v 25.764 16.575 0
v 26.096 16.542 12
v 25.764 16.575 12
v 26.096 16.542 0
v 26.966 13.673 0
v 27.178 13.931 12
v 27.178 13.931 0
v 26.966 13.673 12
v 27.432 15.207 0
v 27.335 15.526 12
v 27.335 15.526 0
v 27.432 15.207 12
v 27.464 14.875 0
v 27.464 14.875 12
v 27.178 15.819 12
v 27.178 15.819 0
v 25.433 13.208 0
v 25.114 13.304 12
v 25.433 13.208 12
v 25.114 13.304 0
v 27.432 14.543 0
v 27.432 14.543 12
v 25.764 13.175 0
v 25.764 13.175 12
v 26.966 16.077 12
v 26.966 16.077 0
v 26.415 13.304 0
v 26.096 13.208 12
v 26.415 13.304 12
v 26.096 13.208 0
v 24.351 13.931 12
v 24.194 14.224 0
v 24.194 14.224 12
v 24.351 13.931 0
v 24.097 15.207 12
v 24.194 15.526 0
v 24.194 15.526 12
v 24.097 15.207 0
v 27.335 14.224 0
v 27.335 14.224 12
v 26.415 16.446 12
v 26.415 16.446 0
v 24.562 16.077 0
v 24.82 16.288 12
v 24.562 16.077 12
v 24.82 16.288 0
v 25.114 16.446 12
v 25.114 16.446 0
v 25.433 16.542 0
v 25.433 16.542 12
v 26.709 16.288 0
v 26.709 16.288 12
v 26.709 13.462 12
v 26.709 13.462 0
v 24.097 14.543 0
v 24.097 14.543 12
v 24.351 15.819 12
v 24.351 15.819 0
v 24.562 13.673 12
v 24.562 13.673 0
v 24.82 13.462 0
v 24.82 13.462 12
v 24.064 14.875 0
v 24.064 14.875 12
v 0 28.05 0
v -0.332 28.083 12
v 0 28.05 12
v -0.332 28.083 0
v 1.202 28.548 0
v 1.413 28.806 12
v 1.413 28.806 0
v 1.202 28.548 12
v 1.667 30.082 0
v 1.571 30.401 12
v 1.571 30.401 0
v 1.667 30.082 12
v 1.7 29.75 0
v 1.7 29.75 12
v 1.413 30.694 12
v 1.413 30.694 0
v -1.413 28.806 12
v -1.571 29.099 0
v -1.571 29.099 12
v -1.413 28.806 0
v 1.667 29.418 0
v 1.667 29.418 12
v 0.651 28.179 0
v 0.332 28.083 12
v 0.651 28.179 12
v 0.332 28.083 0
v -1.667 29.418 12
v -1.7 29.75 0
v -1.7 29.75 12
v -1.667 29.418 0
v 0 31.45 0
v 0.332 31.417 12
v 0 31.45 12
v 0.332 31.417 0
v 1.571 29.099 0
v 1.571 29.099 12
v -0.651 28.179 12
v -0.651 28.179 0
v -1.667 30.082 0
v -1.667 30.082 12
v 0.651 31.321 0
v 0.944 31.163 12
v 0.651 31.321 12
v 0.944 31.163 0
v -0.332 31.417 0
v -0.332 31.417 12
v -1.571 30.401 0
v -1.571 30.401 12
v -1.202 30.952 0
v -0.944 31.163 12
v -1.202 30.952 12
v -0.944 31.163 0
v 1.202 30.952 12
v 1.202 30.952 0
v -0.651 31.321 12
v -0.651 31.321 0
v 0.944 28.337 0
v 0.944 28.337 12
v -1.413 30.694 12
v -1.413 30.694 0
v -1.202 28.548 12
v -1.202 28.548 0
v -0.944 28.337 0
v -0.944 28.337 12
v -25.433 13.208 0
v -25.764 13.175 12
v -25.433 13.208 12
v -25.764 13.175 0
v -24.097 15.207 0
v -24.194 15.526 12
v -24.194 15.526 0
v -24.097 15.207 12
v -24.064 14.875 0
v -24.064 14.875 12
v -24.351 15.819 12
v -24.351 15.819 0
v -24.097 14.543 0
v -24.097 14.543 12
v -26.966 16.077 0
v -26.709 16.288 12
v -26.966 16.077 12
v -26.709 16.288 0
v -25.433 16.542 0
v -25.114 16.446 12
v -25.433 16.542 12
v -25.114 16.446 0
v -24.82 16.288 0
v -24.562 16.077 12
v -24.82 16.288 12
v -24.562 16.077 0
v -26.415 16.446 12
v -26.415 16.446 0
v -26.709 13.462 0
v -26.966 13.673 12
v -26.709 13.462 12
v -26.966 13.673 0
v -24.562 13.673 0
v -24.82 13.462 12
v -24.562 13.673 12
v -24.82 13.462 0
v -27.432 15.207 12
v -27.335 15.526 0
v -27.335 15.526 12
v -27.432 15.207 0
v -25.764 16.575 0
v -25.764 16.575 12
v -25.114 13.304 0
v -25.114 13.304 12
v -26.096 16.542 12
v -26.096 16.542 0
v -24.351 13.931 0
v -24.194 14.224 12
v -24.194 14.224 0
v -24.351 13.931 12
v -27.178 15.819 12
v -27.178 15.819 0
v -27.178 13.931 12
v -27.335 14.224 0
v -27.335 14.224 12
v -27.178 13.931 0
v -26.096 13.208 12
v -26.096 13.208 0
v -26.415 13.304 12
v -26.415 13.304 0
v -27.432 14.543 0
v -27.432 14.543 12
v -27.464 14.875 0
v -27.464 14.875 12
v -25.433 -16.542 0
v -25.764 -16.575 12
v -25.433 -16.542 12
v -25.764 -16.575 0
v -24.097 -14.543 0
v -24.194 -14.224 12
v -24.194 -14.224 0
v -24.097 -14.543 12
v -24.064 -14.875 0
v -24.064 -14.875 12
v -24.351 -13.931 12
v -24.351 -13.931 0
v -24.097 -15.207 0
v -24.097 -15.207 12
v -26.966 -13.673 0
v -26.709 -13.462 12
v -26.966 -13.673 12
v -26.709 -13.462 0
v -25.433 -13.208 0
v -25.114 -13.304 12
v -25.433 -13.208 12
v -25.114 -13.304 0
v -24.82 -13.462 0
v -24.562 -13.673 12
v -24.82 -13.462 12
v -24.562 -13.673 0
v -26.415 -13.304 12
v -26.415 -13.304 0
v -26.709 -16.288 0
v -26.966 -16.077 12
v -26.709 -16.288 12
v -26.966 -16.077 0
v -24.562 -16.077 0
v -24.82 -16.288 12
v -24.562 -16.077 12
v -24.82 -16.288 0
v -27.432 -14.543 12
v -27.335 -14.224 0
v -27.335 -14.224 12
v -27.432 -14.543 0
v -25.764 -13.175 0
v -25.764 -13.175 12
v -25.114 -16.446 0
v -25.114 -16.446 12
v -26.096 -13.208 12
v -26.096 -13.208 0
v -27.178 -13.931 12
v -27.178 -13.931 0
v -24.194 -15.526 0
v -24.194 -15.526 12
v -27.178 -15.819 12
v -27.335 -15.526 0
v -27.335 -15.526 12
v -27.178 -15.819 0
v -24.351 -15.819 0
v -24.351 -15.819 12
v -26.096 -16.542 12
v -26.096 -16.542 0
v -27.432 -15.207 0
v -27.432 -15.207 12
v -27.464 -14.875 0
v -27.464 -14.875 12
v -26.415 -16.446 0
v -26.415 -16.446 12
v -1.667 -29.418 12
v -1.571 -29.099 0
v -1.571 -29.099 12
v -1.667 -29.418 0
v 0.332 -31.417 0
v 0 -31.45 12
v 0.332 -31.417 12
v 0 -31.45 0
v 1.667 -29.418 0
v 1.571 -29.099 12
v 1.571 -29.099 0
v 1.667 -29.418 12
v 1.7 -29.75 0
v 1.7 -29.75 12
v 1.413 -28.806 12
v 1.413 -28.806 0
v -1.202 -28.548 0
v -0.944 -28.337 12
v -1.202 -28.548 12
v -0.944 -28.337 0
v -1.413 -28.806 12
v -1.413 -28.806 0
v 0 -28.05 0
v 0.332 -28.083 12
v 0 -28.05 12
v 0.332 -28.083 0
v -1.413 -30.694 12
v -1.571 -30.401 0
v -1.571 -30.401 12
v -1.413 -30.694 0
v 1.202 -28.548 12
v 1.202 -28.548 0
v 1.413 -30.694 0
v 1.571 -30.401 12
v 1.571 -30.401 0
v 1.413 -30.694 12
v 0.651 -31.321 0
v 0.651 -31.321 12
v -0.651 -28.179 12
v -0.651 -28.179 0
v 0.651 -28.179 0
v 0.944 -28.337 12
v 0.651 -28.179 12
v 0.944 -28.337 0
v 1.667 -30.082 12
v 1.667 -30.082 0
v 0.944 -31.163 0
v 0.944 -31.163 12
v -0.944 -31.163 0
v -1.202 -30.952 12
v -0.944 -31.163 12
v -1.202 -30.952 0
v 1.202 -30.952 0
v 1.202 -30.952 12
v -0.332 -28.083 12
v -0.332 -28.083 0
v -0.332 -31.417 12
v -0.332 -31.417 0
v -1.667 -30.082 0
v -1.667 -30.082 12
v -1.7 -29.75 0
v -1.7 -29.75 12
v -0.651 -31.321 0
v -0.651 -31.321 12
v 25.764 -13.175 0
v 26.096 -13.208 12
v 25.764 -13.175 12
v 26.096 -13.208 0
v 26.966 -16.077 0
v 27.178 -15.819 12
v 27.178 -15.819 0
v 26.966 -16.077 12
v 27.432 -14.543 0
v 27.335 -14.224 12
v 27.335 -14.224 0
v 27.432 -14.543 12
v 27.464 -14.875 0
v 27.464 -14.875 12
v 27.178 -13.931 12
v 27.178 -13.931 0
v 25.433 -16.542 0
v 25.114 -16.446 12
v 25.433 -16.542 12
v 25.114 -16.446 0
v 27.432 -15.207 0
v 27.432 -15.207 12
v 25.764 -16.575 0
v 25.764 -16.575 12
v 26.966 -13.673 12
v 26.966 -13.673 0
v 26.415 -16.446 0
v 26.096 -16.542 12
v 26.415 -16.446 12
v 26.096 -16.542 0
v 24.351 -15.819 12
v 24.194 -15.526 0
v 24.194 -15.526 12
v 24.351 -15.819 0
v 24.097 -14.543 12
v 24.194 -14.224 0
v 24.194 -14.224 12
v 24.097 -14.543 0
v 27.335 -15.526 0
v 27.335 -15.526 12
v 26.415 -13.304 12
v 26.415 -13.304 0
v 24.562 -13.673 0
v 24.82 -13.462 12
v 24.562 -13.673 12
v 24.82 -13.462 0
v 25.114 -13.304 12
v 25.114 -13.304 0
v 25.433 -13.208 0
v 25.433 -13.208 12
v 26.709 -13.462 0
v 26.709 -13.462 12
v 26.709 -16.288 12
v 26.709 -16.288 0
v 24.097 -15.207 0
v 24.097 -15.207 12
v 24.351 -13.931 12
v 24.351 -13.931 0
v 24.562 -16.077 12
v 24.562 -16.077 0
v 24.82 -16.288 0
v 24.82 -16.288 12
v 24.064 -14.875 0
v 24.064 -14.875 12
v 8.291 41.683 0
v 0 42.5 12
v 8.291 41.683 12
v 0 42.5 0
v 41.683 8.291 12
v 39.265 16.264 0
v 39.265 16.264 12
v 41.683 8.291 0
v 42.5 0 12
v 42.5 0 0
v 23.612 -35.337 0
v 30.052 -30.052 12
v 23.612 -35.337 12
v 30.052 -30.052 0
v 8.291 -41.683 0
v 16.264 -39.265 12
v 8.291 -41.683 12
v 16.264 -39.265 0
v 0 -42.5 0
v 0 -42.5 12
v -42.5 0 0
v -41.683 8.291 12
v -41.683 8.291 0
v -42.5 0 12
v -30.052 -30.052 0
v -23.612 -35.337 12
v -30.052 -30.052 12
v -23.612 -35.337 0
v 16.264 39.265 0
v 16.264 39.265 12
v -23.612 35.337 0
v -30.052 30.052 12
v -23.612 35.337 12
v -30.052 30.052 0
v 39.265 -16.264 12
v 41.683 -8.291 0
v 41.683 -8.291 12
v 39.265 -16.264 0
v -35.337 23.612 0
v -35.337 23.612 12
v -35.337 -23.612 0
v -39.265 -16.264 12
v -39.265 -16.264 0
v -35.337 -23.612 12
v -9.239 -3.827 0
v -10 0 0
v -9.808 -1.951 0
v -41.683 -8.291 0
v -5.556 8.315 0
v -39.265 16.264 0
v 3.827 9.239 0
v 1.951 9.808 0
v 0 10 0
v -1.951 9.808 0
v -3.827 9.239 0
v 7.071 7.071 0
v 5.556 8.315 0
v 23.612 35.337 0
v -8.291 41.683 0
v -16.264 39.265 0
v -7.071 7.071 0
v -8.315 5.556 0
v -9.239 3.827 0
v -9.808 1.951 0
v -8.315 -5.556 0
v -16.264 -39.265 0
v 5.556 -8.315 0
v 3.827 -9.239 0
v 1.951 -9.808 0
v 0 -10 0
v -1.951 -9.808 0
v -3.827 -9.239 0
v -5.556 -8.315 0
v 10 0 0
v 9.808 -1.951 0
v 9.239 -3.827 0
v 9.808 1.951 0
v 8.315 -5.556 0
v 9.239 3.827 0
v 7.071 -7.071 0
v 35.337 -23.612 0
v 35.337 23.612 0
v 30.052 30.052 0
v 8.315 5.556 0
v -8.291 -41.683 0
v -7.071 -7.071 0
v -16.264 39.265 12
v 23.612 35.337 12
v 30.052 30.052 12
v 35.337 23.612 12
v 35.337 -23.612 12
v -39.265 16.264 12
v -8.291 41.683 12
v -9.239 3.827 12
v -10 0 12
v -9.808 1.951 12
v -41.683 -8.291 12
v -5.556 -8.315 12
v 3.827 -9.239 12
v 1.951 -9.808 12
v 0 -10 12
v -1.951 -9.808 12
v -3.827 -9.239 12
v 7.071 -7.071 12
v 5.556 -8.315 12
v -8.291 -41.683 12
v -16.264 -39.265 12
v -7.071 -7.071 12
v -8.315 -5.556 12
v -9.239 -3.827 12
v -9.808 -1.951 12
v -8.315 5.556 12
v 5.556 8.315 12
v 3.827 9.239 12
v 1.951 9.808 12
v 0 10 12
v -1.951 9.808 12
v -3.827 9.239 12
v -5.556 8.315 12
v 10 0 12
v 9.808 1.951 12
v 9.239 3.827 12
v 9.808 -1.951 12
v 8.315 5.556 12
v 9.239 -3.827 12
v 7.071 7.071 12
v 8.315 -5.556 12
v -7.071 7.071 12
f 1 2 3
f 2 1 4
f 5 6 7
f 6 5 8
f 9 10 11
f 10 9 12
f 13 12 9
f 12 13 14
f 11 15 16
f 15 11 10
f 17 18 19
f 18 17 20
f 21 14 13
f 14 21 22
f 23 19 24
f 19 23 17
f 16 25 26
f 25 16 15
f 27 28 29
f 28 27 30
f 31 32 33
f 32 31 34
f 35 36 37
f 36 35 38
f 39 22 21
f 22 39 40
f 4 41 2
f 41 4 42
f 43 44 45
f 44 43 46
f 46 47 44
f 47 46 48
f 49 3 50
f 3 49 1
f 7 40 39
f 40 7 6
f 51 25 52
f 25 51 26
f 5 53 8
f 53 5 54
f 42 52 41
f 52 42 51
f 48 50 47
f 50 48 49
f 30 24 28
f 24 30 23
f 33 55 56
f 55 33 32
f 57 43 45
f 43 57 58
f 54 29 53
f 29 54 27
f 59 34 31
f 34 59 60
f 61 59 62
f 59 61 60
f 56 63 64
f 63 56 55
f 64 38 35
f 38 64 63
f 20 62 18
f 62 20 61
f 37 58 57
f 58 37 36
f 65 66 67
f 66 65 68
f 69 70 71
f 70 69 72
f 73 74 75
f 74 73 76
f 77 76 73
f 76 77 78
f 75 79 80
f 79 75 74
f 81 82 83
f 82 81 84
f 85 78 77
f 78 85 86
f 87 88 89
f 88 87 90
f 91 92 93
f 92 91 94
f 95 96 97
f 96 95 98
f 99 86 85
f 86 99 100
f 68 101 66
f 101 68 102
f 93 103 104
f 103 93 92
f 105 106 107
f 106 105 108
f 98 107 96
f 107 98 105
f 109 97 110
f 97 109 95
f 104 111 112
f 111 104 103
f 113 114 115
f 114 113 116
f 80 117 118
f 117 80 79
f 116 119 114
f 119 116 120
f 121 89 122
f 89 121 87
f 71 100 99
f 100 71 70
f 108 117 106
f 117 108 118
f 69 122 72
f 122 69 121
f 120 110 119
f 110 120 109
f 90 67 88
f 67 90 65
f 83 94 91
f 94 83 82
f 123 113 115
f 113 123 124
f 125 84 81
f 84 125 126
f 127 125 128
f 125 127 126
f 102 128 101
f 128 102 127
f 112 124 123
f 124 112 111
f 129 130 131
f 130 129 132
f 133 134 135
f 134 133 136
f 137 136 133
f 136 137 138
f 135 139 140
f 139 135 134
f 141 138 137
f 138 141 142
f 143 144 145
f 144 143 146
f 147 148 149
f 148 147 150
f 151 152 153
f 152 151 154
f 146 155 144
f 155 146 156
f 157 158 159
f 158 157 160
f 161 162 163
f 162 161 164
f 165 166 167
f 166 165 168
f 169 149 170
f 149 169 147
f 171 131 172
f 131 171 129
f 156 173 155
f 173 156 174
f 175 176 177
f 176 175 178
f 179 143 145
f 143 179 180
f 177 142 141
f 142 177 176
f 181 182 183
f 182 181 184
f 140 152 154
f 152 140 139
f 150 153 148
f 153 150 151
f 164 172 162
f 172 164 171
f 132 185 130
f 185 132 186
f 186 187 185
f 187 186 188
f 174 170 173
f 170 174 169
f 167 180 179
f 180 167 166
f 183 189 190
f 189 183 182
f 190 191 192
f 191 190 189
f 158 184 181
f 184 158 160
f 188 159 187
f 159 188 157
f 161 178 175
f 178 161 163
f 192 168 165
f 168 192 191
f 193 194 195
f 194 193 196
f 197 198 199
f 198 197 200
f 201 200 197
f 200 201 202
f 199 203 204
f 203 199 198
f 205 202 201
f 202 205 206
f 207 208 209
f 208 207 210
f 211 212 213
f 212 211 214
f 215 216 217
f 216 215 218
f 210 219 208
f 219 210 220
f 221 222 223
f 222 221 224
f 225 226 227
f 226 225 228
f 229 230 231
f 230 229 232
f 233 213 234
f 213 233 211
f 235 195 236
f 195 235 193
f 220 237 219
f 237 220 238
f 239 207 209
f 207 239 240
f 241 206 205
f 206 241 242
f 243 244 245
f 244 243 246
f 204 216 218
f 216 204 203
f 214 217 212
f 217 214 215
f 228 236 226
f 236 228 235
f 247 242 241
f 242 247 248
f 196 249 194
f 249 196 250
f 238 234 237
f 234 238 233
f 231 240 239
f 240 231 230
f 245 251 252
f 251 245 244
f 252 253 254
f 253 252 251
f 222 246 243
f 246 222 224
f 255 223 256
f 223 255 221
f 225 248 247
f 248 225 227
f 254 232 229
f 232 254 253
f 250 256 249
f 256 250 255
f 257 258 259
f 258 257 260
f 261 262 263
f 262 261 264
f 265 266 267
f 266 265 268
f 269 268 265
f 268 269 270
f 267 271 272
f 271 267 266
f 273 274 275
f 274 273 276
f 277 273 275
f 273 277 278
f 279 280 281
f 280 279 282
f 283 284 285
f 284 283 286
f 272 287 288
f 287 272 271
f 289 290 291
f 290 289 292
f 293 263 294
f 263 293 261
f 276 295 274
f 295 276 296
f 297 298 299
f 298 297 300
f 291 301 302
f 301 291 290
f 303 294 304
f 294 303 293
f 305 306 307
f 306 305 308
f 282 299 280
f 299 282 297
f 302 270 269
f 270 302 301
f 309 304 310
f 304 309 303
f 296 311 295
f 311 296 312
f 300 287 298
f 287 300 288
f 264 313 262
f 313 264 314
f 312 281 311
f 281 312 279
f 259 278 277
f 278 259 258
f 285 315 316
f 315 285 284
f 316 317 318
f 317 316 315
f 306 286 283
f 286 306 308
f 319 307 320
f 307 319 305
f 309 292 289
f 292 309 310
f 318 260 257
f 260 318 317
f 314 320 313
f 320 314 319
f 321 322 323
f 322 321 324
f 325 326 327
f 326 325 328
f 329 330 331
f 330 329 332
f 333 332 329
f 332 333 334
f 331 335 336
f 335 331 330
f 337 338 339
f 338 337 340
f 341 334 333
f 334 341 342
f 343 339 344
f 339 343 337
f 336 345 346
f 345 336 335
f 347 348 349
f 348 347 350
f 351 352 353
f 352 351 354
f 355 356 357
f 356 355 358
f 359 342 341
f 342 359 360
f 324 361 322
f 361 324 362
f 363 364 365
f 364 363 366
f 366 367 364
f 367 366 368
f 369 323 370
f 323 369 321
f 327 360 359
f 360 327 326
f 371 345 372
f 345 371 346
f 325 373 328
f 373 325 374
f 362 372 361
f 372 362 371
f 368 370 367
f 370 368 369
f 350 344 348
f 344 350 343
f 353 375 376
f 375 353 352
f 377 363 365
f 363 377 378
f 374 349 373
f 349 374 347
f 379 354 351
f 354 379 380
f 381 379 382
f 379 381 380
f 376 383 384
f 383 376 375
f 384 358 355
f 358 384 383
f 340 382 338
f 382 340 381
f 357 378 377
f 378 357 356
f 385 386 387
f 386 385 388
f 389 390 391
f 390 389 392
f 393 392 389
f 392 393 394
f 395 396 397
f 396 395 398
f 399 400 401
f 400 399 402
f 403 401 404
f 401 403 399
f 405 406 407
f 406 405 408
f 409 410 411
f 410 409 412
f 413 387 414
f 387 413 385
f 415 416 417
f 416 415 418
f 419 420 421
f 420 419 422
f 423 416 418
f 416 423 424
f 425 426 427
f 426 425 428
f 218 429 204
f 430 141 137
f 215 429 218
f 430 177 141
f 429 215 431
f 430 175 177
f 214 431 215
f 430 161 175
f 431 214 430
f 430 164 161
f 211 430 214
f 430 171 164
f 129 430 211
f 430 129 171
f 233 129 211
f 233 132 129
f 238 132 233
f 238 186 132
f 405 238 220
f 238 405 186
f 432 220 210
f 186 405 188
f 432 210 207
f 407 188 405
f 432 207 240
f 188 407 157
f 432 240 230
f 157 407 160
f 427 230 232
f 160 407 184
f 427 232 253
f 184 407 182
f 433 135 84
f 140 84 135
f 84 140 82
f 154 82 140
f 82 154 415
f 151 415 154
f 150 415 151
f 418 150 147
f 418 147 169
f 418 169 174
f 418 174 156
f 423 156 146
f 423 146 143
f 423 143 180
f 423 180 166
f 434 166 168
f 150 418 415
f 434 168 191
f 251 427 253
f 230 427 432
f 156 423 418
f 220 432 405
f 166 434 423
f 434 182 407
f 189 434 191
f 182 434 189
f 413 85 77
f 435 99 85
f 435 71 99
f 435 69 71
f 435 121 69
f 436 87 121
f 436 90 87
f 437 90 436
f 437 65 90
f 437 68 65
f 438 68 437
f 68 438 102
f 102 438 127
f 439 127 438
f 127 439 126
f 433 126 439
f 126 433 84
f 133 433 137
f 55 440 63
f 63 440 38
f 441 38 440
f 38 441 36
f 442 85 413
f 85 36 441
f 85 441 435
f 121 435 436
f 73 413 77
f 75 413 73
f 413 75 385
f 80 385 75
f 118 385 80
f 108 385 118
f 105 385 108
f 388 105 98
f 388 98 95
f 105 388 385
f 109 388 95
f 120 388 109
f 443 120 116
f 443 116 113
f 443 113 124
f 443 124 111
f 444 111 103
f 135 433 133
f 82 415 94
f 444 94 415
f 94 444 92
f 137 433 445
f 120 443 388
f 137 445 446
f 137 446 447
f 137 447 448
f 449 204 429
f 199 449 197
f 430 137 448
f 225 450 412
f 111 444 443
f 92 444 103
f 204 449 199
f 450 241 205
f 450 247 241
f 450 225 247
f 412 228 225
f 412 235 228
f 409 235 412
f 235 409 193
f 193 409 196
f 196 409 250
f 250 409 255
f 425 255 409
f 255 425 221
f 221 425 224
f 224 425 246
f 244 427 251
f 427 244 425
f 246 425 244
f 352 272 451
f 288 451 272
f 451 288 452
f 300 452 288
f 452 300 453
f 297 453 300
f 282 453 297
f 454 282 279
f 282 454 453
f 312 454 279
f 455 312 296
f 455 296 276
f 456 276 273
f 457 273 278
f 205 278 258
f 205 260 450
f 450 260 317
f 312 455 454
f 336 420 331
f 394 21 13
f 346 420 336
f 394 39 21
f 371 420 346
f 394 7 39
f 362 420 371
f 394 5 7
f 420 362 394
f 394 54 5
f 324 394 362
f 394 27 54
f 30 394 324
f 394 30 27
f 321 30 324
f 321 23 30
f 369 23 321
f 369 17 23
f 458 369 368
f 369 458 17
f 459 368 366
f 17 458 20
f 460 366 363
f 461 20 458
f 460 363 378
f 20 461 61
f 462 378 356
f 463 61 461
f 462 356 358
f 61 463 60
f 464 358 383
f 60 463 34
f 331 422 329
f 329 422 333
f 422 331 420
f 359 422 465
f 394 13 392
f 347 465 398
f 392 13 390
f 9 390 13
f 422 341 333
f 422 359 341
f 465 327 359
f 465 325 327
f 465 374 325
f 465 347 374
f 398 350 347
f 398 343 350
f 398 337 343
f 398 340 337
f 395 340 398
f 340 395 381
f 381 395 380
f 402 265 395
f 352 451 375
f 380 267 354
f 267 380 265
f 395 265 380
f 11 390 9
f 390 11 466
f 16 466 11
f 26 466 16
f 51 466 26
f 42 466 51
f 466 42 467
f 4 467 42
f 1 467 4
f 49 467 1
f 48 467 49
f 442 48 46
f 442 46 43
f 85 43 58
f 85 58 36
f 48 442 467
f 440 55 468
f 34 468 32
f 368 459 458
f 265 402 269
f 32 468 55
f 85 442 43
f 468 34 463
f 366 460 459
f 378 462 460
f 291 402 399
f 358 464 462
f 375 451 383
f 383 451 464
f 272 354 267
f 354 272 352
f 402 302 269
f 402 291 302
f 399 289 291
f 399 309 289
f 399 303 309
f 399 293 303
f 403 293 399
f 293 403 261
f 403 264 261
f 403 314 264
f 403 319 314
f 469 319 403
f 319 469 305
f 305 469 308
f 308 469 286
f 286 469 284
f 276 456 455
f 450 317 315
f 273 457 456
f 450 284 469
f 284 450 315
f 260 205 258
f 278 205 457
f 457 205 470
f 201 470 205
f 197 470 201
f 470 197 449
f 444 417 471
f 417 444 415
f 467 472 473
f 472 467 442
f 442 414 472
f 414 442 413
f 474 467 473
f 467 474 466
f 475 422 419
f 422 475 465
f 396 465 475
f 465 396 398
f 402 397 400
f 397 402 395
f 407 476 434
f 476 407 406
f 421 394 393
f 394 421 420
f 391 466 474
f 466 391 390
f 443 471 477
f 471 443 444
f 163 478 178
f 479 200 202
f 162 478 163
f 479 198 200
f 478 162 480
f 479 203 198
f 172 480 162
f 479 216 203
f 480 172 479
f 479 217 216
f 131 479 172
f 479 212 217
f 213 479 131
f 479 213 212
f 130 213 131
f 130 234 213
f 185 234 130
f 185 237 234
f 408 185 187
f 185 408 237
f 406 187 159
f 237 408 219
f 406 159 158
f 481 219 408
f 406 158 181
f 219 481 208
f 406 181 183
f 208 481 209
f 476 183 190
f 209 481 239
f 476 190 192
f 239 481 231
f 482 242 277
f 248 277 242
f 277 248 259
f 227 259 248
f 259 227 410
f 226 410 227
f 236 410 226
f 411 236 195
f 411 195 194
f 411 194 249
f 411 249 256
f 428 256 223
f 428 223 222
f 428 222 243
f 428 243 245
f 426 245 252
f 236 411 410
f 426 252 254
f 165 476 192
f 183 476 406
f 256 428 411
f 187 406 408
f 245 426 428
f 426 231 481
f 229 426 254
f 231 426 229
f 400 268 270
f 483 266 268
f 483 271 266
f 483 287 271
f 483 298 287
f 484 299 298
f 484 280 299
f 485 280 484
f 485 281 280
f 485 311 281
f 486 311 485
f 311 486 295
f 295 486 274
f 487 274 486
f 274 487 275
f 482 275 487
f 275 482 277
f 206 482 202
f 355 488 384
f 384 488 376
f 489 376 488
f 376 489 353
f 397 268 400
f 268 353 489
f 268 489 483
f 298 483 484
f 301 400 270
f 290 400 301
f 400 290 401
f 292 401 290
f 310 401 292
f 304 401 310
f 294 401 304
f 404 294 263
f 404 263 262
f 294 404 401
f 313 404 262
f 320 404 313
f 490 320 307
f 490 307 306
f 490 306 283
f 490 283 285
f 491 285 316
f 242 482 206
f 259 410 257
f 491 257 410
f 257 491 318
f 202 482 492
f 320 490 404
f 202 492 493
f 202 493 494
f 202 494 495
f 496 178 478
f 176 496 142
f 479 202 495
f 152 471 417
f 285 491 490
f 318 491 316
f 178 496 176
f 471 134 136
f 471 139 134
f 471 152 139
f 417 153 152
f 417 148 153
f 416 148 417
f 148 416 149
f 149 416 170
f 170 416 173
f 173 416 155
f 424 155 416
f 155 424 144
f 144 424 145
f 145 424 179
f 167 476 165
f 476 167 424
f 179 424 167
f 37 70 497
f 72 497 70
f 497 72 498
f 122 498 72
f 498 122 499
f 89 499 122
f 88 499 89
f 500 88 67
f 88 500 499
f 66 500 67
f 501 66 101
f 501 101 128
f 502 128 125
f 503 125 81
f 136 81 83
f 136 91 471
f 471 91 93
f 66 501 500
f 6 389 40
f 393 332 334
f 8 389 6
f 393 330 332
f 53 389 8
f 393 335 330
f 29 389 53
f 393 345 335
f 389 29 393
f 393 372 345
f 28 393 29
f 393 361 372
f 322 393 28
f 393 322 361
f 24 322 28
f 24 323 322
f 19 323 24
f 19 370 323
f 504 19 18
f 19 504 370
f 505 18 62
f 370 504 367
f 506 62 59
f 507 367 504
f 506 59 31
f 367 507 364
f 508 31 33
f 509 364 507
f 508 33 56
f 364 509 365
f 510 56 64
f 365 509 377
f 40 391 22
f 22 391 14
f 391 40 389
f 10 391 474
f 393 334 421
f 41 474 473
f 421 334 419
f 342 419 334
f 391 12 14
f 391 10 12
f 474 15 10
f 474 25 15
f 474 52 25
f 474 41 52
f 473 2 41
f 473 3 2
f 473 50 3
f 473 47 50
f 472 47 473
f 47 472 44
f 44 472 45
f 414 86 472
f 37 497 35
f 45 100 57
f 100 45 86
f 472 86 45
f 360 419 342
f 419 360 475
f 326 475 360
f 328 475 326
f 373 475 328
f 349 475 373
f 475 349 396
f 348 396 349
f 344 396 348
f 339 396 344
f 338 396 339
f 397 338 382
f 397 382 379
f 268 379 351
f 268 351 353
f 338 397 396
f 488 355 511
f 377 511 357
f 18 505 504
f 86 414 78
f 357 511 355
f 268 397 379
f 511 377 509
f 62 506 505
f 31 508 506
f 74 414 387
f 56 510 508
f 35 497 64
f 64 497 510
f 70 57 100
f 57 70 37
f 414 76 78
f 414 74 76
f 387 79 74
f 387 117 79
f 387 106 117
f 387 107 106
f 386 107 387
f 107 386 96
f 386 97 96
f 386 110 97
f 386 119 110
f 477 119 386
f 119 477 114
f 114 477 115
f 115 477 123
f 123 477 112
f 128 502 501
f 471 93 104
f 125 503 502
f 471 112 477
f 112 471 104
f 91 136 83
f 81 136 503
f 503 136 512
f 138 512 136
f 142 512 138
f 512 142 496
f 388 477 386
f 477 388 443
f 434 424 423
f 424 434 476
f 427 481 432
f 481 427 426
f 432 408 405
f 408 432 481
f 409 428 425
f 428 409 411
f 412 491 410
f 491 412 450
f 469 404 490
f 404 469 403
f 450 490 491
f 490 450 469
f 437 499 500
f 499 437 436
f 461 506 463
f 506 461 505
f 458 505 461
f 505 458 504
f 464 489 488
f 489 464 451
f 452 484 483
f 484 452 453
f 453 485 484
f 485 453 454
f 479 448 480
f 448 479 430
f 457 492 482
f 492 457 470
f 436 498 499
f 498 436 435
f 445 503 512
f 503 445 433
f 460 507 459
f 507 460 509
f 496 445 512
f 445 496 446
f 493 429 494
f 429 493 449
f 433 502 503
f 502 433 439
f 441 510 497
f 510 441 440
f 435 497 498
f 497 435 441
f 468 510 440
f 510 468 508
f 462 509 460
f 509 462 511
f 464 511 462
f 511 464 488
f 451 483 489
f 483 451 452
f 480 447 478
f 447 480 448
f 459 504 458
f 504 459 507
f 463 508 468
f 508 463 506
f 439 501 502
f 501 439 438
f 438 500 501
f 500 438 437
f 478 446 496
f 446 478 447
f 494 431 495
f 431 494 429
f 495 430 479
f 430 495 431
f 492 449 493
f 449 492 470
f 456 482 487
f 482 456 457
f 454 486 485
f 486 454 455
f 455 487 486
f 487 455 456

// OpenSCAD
$fn = 32;

// ----------------------------------------------------------------------
// Flange Ø85 x 12
// 6 holes on a Ø59.5 bolt circle, bolted joints
// ----------------------------------------------------------------------

// --- parameters (mm) ---
flange_d = 85;   // outside diameter of the flange
thickness = 12;  // flange thickness
holes = 6;       // number of bolt holes
pcd = 59.5;      // bolt circle diameter
start_deg = 30;  // angle of the first hole, from +X
hole_d = 3.4;    // bolt hole diameter
bore_d = 20;     // central through bore
hub_d = 30;      // hub outside diameter
hub_h = 0;       // hub height above the flange face (0 = no hub)

// --- derived feature positions (mm) ---
height = thickness + hub_h;  // = 12   overall height of the part
pcd_r = pcd / 2;             // = 29.75   bolt circle radius
hole_step = 360 / holes;     // = 60   angular pitch
feature_centers = [
  [pcd_r * cos(start_deg + 0 * hole_step), pcd_r * sin(start_deg + 0 * hole_step)],
  [pcd_r * cos(start_deg + 1 * hole_step), pcd_r * sin(start_deg + 1 * hole_step)],
  [pcd_r * cos(start_deg + 2 * hole_step), pcd_r * sin(start_deg + 2 * hole_step)],
  [pcd_r * cos(start_deg + 3 * hole_step), pcd_r * sin(start_deg + 3 * hole_step)],
  [pcd_r * cos(start_deg + 4 * hole_step), pcd_r * sin(start_deg + 4 * hole_step)],
  [pcd_r * cos(start_deg + 5 * hole_step), pcd_r * sin(start_deg + 5 * hole_step)]
];   // bolt hole centres on the pitch circle

// flange disc, every hole and the bore cut straight through
difference() {
  union() {
    cylinder(d = flange_d, h = thickness);
  }
  translate([0, 0, -1]) cylinder(d = bore_d, h = height + 2);  // bore, through
  for (centre = feature_centers)
    translate([centre[0], centre[1], -1]) cylinder(d = hole_d, h = thickness + 2);
}
